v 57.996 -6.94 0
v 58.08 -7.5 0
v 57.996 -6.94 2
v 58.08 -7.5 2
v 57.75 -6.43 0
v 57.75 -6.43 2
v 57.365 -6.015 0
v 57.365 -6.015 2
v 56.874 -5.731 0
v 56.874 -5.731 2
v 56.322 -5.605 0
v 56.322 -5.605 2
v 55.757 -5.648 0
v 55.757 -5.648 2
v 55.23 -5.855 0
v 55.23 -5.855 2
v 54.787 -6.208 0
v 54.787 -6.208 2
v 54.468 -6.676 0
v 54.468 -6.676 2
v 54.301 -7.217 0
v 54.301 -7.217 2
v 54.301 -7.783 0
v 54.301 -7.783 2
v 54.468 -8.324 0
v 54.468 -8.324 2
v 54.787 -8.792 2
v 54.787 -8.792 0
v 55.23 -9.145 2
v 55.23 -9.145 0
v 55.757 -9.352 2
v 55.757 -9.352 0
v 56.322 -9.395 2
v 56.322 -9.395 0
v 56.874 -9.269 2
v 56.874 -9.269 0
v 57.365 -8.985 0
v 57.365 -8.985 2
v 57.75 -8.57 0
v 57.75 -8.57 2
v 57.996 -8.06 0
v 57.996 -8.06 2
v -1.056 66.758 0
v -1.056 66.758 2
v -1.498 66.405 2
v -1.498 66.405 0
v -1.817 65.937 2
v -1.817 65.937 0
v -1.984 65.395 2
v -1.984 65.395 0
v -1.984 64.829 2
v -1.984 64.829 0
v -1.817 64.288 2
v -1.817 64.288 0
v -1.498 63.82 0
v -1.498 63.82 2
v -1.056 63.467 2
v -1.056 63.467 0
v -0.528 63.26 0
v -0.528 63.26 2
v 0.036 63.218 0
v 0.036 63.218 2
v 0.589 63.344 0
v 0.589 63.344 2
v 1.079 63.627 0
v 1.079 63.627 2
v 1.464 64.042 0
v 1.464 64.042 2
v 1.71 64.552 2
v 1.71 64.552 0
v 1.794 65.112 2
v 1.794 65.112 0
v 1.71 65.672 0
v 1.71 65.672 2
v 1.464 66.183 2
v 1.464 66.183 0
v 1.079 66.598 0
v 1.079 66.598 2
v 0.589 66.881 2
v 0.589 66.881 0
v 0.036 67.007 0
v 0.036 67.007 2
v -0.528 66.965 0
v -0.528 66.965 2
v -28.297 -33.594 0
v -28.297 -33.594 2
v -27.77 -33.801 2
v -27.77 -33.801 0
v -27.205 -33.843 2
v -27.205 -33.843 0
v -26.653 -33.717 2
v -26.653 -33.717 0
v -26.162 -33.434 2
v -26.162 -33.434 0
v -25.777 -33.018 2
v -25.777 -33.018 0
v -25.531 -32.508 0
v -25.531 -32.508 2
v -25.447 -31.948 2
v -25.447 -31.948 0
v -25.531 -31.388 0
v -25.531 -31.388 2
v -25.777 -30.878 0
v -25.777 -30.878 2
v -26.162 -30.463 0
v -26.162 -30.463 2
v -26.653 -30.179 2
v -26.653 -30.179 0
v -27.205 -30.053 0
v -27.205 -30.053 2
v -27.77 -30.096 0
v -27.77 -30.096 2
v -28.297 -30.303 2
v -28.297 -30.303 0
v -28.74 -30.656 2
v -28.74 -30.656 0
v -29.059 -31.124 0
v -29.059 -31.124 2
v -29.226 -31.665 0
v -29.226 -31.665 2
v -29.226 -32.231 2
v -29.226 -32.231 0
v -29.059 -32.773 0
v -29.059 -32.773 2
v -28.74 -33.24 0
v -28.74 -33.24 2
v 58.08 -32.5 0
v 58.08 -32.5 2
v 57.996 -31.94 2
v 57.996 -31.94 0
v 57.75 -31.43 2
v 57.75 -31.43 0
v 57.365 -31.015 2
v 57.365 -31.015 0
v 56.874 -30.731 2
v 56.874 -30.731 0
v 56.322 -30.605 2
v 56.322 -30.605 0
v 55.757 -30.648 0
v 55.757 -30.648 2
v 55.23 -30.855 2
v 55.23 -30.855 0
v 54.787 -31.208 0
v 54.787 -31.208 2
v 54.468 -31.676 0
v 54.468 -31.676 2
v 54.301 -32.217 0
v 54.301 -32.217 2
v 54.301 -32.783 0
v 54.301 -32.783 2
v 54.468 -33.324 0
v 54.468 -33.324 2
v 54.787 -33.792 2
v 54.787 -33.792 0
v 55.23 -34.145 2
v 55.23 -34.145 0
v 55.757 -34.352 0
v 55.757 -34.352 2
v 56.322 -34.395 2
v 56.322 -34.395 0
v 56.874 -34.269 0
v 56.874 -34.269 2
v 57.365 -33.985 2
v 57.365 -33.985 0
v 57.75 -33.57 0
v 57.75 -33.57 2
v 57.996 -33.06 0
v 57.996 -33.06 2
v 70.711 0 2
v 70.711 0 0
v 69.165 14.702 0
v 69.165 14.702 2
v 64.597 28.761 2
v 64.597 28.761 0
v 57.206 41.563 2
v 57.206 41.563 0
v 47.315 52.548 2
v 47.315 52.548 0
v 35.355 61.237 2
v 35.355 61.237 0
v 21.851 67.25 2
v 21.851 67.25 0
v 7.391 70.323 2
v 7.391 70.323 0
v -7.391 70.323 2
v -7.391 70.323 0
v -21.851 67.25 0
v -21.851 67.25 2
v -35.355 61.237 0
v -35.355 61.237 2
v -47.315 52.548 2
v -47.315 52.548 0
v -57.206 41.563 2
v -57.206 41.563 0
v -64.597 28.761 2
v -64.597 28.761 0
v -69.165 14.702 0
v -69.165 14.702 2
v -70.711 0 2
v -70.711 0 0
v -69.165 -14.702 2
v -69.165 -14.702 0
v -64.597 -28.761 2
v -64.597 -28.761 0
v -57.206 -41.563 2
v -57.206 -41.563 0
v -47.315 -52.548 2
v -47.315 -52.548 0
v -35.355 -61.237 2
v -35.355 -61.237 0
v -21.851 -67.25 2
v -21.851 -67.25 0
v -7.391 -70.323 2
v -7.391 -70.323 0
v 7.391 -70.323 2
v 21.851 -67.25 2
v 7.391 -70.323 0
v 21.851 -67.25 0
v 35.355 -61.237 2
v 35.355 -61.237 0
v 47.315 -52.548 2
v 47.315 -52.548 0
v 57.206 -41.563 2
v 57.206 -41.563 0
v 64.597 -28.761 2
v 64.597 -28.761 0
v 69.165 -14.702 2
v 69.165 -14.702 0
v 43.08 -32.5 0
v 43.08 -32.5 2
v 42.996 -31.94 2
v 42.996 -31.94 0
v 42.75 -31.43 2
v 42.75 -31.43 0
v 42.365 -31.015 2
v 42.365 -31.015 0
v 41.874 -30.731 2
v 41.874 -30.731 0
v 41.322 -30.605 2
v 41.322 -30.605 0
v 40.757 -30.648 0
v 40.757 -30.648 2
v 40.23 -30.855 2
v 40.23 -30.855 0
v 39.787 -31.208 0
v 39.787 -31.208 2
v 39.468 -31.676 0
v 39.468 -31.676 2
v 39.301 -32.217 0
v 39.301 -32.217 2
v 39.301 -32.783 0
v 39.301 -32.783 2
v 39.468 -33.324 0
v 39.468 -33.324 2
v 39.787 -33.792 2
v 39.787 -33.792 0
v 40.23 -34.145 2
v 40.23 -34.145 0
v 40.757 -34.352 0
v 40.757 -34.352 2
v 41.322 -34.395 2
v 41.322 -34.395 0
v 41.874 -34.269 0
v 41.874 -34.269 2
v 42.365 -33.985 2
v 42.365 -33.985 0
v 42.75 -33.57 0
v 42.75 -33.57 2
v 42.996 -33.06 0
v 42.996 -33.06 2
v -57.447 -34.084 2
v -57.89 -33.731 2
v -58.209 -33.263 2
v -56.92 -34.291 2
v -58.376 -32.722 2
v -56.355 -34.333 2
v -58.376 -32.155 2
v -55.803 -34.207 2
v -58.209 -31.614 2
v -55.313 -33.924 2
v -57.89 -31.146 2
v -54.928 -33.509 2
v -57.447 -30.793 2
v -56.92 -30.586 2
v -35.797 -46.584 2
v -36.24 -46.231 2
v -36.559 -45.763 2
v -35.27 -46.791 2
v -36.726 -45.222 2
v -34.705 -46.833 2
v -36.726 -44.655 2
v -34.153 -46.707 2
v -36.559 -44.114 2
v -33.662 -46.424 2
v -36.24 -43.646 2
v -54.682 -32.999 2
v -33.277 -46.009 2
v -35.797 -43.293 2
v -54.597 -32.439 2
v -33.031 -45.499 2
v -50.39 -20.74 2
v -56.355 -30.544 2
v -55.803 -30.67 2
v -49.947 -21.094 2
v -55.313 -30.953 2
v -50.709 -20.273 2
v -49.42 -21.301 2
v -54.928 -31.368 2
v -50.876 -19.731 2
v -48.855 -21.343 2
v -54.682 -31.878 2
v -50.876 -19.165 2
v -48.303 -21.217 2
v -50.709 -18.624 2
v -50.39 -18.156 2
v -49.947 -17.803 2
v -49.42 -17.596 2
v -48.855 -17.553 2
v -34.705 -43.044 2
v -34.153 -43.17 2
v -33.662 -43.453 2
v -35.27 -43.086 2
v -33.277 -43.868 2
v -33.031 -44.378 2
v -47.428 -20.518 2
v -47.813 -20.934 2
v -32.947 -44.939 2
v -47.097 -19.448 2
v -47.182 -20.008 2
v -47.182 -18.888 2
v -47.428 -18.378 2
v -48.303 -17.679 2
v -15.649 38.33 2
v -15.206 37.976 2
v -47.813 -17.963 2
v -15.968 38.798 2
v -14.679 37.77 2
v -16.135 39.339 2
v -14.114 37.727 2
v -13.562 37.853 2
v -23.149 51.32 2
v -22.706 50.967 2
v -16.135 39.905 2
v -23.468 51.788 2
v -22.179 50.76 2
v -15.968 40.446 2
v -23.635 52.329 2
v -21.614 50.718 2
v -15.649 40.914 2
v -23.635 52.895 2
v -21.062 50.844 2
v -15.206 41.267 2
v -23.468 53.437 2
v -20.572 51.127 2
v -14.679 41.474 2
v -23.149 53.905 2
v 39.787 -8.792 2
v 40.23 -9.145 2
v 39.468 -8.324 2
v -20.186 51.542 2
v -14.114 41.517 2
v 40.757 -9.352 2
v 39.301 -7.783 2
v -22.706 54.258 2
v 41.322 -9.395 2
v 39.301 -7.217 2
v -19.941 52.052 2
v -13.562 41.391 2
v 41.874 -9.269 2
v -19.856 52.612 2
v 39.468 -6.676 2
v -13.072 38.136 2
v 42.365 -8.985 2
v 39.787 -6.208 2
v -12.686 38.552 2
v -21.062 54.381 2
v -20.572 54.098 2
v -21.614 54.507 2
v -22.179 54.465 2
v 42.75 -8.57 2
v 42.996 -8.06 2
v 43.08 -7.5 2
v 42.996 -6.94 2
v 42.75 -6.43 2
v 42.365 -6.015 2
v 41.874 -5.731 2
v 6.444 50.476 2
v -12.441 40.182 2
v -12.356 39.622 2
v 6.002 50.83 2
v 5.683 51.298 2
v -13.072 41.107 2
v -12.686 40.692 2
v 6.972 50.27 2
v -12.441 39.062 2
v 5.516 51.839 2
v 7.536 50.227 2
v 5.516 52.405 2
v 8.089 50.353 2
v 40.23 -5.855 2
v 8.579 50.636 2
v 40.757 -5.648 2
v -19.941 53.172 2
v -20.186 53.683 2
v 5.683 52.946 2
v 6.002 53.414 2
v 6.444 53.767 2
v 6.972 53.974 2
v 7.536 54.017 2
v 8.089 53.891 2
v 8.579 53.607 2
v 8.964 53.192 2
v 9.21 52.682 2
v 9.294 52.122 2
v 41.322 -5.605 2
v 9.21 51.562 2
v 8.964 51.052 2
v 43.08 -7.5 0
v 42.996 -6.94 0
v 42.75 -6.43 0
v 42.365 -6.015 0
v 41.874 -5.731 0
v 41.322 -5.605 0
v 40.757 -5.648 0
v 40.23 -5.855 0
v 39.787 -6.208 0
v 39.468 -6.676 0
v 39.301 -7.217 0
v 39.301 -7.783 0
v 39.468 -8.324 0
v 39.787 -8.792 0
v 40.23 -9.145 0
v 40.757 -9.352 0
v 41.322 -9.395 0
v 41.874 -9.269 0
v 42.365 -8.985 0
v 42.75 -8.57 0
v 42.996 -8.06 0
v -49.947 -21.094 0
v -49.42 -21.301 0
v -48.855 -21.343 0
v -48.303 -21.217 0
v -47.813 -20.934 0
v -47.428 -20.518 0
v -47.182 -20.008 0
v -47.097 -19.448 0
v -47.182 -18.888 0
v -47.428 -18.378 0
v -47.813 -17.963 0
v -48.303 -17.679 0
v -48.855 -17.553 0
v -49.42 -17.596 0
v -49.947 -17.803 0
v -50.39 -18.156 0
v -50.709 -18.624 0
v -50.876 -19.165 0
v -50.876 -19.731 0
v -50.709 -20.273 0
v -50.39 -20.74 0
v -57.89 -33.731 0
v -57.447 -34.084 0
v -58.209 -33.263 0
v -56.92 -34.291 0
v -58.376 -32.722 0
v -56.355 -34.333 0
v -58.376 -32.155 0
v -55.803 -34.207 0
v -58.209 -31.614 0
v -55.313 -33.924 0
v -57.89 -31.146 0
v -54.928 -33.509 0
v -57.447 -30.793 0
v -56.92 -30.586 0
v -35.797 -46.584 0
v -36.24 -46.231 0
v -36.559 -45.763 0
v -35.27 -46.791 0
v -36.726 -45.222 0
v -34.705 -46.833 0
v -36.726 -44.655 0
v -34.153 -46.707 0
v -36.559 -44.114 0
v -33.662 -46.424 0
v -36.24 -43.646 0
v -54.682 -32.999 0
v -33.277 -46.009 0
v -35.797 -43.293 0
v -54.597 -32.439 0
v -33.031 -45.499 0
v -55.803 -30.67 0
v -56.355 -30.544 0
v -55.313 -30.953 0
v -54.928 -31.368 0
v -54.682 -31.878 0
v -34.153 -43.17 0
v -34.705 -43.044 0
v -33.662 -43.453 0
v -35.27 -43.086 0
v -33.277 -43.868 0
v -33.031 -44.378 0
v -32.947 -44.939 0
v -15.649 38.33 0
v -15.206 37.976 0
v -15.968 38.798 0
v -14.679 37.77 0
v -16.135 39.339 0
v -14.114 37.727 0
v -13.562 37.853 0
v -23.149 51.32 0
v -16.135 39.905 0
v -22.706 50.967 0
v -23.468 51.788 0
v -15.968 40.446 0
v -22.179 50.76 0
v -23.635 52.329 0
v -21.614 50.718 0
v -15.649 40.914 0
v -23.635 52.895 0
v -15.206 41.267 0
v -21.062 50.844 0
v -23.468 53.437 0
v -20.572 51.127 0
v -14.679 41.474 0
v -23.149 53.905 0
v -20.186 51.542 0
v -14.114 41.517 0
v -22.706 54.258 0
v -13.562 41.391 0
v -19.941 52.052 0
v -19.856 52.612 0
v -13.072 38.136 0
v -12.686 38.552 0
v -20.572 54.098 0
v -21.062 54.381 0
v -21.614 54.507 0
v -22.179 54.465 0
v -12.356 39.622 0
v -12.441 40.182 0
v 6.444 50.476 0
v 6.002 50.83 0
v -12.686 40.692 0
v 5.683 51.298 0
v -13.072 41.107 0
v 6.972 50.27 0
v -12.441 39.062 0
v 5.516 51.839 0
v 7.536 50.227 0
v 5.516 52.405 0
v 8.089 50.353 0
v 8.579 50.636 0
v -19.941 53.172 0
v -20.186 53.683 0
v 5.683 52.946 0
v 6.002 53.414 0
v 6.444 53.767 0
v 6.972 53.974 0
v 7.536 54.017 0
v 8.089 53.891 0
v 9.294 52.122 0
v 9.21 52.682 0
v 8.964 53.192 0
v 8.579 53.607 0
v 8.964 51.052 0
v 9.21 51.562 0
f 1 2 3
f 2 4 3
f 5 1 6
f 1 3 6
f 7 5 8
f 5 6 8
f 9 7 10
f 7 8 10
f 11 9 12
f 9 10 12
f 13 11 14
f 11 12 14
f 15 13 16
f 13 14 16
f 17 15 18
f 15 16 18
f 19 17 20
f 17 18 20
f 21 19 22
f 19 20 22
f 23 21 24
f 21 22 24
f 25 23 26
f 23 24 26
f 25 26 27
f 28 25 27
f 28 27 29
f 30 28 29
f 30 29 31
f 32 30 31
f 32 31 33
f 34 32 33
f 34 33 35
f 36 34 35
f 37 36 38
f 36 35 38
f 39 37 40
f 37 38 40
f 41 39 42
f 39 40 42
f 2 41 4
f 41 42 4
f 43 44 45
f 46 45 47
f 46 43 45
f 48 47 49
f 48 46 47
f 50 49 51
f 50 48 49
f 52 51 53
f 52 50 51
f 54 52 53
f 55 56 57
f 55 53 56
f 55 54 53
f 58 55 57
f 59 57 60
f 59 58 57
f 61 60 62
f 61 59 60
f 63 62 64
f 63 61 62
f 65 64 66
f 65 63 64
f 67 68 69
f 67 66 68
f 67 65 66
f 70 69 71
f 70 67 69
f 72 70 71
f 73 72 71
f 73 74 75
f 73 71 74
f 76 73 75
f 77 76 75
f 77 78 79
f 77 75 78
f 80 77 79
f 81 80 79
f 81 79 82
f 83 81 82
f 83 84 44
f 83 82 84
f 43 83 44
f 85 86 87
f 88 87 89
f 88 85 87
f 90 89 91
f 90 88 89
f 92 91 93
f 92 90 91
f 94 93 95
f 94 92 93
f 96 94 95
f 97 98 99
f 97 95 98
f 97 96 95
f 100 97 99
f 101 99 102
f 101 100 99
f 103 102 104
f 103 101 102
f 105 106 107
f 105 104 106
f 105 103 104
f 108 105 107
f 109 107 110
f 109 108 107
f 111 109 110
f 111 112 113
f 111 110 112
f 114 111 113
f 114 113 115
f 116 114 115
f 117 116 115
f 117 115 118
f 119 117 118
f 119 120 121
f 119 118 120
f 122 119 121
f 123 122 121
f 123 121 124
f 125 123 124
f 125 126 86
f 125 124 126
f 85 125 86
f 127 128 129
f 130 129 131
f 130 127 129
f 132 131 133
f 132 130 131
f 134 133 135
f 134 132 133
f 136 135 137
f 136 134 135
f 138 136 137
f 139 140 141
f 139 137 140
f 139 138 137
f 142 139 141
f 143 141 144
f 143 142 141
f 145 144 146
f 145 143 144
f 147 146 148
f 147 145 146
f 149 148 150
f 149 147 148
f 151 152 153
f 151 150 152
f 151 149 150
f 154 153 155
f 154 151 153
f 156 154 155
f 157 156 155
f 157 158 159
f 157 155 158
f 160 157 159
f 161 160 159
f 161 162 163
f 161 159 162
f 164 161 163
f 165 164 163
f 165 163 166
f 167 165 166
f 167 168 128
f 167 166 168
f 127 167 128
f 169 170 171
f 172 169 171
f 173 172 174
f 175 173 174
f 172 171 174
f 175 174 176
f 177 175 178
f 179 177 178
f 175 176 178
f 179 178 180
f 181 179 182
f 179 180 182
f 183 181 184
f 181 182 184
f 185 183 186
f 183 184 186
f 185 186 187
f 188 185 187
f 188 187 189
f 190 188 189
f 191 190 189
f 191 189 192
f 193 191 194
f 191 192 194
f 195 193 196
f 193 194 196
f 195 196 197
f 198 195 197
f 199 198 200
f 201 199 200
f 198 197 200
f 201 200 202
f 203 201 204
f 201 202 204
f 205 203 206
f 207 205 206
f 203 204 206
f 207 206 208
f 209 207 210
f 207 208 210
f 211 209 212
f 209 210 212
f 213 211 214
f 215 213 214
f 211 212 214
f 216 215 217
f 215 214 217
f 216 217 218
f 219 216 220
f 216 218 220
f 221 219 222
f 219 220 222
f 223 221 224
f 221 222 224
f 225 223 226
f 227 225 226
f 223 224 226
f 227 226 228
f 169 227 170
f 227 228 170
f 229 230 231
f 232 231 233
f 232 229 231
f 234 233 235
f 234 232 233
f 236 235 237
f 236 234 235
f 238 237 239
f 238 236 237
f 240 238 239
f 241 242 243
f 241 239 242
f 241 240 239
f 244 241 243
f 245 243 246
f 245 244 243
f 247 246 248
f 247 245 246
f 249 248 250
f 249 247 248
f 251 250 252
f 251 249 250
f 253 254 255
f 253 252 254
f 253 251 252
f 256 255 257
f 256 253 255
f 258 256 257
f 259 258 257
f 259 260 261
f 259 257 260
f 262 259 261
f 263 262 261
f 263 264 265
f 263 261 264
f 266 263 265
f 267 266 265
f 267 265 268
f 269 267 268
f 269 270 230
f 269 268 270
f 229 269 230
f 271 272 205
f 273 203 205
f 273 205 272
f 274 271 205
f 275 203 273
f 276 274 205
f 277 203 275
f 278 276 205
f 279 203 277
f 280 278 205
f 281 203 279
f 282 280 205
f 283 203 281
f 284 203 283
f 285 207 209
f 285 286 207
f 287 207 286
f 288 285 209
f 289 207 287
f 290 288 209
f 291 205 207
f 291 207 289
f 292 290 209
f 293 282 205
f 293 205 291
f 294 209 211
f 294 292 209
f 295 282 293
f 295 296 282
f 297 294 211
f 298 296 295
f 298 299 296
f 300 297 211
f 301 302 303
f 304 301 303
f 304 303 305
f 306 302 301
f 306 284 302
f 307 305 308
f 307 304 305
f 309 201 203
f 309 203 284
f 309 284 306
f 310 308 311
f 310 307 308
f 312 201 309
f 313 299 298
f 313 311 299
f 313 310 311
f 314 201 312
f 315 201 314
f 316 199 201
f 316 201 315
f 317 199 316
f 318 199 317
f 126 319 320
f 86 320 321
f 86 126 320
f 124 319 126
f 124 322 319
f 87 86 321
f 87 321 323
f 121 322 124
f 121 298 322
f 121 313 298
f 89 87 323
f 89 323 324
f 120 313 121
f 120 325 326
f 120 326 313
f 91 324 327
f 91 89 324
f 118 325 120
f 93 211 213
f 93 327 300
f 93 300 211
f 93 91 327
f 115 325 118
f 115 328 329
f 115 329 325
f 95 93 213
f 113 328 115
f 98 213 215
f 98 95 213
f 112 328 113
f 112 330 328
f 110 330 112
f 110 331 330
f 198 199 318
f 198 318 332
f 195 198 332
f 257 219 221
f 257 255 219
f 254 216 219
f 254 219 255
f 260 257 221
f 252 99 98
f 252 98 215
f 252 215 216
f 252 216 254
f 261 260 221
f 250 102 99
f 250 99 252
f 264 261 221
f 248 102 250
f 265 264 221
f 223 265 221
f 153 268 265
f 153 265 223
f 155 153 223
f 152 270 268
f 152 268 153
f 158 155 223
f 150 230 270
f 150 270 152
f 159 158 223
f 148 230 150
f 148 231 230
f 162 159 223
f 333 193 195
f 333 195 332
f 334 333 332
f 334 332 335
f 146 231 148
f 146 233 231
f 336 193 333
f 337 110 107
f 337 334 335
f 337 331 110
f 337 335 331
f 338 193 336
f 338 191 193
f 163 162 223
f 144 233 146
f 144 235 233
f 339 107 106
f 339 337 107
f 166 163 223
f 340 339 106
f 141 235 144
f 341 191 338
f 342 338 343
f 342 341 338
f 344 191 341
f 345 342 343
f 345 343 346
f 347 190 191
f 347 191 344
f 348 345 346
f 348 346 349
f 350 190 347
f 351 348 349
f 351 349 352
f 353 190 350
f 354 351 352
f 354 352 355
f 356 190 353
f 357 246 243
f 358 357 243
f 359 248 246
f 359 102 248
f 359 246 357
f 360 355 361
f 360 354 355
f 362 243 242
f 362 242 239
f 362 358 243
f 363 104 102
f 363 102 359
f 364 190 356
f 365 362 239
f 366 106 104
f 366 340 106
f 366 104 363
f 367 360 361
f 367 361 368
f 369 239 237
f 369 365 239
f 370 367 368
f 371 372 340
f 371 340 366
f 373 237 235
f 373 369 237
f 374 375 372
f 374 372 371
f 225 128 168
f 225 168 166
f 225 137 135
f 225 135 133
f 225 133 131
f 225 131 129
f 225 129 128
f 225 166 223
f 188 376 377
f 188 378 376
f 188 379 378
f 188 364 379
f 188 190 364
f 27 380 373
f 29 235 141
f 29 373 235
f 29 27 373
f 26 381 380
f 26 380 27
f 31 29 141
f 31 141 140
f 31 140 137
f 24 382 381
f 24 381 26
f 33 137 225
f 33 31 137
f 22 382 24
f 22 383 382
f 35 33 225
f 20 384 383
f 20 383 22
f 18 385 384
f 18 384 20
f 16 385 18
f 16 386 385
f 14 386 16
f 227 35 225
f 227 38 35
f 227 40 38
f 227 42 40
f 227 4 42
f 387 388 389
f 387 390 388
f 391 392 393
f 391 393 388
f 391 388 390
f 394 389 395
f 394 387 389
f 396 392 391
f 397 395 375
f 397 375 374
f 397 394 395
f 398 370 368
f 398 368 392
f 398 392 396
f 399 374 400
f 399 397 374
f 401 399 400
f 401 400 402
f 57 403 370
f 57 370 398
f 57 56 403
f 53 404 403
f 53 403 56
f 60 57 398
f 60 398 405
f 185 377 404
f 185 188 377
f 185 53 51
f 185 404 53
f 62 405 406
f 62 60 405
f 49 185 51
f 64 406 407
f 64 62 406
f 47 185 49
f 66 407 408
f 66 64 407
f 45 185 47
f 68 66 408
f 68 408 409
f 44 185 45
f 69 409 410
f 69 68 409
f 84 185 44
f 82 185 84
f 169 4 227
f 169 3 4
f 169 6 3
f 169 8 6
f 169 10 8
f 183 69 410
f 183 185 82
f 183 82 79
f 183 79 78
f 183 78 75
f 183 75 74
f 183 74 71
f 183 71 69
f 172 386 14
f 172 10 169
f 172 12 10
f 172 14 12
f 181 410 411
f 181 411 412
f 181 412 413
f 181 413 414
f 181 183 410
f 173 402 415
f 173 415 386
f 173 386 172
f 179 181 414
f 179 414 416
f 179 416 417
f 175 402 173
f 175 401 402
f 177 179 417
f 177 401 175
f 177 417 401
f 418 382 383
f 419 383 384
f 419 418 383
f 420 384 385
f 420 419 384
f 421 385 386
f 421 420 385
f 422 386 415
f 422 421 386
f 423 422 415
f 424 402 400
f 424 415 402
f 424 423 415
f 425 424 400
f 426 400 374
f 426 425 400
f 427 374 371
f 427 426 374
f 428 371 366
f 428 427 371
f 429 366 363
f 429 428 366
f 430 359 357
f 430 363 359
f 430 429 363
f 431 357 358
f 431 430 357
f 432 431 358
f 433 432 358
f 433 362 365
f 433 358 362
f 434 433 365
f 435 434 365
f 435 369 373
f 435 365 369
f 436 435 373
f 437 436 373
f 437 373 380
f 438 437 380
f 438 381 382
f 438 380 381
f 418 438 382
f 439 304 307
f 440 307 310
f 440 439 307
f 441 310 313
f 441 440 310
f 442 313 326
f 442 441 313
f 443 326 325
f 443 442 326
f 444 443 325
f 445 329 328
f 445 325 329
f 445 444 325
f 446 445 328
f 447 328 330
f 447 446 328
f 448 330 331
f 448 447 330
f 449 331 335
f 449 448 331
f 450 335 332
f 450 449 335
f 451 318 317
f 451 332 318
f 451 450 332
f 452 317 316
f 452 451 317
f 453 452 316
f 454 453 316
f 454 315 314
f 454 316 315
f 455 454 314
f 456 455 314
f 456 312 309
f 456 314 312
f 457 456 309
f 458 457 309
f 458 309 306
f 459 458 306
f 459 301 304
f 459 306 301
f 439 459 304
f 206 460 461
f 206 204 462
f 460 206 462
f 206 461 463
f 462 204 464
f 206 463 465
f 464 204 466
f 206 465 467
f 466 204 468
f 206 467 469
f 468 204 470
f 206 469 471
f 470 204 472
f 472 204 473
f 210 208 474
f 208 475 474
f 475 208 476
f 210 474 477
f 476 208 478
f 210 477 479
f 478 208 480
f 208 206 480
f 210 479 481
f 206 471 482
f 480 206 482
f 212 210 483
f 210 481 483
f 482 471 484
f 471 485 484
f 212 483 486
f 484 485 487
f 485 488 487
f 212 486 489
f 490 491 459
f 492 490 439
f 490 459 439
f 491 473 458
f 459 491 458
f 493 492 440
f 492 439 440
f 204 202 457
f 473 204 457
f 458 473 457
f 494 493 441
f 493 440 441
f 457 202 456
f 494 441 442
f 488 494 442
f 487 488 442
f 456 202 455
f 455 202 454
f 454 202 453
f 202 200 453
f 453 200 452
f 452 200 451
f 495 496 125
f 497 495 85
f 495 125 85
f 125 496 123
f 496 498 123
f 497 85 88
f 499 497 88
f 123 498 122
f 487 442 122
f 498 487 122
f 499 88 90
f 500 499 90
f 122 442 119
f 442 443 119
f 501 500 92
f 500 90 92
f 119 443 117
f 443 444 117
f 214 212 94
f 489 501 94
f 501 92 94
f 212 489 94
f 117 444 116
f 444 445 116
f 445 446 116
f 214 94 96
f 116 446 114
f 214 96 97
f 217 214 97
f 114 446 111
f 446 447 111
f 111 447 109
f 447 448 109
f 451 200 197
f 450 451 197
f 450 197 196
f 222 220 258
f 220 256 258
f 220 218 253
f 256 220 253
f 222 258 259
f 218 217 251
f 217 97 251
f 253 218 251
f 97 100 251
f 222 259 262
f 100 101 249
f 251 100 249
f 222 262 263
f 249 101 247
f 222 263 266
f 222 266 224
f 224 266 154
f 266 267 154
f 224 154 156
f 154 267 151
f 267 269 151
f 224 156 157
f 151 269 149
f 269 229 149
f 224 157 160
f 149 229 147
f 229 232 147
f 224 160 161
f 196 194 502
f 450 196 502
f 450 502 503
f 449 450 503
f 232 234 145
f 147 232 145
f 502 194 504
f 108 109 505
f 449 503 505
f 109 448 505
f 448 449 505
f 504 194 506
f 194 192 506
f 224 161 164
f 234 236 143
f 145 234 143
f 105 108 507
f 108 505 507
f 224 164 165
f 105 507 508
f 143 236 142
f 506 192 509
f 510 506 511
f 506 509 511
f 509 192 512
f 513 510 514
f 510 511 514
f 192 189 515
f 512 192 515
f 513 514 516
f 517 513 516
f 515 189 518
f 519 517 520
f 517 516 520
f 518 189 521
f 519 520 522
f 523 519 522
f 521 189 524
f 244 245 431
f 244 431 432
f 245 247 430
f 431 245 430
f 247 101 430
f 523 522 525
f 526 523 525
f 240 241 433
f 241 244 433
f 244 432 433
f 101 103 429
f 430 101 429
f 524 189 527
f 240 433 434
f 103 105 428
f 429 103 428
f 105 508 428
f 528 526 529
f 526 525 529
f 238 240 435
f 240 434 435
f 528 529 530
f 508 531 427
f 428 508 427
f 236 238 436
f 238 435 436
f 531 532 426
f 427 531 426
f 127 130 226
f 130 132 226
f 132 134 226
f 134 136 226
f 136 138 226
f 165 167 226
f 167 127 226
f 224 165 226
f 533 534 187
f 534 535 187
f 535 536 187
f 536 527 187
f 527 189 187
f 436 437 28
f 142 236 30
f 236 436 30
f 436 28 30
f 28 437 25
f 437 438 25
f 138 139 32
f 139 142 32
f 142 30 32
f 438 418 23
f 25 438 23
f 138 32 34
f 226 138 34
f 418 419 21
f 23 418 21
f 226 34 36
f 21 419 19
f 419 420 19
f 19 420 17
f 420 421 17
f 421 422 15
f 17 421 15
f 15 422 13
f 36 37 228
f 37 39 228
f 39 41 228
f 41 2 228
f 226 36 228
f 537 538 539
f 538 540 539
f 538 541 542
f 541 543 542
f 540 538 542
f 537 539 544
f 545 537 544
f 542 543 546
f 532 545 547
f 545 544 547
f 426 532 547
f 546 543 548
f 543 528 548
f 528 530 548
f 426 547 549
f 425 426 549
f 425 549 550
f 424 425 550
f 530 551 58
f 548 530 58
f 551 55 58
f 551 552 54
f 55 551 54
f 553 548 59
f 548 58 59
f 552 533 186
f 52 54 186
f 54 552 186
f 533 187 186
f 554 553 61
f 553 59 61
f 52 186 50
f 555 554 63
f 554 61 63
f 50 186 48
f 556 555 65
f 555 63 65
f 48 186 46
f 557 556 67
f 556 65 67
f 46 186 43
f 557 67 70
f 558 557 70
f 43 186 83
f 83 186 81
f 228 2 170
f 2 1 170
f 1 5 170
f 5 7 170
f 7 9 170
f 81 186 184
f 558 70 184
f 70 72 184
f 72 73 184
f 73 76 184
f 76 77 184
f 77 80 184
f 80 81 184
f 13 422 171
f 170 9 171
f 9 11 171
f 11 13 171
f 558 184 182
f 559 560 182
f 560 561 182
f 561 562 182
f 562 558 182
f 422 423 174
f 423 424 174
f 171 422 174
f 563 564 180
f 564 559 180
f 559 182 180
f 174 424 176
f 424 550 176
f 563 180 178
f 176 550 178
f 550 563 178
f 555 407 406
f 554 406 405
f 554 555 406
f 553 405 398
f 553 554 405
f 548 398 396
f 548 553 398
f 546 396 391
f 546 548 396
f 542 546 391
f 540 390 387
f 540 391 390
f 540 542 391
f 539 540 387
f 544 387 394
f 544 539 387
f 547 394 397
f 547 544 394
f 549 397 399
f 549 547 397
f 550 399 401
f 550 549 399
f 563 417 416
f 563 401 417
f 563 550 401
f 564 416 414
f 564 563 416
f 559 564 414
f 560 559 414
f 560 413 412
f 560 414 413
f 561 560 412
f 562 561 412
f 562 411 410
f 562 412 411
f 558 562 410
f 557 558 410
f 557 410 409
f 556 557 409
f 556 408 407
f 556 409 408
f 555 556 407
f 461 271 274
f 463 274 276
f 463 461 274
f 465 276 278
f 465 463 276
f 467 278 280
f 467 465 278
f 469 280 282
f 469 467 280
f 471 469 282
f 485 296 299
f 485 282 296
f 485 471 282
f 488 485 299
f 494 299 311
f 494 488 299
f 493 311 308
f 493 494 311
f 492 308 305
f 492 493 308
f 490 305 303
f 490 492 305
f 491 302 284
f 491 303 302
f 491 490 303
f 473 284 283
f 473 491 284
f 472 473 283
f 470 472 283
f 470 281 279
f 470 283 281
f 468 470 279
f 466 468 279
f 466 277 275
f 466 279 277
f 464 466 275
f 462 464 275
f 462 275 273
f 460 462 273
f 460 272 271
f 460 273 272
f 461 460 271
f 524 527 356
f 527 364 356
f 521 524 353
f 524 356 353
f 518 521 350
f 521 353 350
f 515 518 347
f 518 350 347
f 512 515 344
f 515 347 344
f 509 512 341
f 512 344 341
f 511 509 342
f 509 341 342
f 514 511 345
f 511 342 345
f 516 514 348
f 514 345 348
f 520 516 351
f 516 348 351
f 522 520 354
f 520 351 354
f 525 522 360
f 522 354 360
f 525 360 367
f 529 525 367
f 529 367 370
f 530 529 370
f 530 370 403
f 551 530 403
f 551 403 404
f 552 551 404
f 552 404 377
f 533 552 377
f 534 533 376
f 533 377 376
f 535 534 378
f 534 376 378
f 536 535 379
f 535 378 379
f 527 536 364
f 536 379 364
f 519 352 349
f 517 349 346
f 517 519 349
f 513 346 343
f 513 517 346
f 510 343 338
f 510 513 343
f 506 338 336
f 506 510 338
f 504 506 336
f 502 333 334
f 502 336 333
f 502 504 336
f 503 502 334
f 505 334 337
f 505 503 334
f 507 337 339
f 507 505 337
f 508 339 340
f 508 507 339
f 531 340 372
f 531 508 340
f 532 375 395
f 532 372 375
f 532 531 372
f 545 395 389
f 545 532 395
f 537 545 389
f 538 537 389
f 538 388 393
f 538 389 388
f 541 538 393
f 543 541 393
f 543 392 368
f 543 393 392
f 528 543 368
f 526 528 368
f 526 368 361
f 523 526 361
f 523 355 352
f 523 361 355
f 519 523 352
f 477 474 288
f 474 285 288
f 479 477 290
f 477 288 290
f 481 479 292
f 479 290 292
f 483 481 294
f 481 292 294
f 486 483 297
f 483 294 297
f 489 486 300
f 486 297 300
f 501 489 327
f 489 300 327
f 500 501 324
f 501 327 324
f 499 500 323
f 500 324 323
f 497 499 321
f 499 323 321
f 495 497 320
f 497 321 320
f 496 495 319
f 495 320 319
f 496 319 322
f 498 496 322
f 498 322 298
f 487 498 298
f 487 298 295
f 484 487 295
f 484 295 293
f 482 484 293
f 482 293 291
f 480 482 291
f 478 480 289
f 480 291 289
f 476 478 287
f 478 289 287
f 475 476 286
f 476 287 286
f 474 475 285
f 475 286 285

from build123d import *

# Parameters (mm, degrees)
SKETCH_1_R               = 70.710678119
EXTRUDE_1_DEPTH          = 2
SKETCH_2_R               = 1.9
CUT_EXTRUDE_2_DEPTH      = 101.019998
PATTERN_CIRCULAR_1_COUNT = 3


with BuildPart() as part:
    # ｽｹｯﾁ1 → ﾎﾞｽ - 押し出し1 (new body)
    with BuildSketch(Plane.XY):
        Circle(SKETCH_1_R)
    extrude(amount=EXTRUDE_1_DEPTH)

    # ｽｹｯﾁ2 → ｶｯﾄ - 押し出し2 (cut, symmetric)
    with BuildSketch(Plane.XY):
        with Locations((41.18, -7.5)):
            Circle(SKETCH_2_R)
        with Locations((41.18, -32.5)):
            Circle(SKETCH_2_R)
        with Locations((56.18, -32.5)):
            Circle(SKETCH_2_R)
        with Locations((56.18, -7.5)):
            Circle(SKETCH_2_R)
    cut_extrude_2 = extrude(amount=CUT_EXTRUDE_2_DEPTH, both=True, mode=Mode.SUBTRACT)

    # 円形ﾊﾟﾀｰﾝ1: ｶｯﾄ - 押し出し2 ×3 about axis
    pattern_circular_1_axis = Axis((-0.140995034, 0.057927294, 0), (0, 0, 1))
    for i in range(1, PATTERN_CIRCULAR_1_COUNT):
        add(cut_extrude_2.rotate(pattern_circular_1_axis, i * 360 / PATTERN_CIRCULAR_1_COUNT), mode=Mode.SUBTRACT)


solid = part.part
